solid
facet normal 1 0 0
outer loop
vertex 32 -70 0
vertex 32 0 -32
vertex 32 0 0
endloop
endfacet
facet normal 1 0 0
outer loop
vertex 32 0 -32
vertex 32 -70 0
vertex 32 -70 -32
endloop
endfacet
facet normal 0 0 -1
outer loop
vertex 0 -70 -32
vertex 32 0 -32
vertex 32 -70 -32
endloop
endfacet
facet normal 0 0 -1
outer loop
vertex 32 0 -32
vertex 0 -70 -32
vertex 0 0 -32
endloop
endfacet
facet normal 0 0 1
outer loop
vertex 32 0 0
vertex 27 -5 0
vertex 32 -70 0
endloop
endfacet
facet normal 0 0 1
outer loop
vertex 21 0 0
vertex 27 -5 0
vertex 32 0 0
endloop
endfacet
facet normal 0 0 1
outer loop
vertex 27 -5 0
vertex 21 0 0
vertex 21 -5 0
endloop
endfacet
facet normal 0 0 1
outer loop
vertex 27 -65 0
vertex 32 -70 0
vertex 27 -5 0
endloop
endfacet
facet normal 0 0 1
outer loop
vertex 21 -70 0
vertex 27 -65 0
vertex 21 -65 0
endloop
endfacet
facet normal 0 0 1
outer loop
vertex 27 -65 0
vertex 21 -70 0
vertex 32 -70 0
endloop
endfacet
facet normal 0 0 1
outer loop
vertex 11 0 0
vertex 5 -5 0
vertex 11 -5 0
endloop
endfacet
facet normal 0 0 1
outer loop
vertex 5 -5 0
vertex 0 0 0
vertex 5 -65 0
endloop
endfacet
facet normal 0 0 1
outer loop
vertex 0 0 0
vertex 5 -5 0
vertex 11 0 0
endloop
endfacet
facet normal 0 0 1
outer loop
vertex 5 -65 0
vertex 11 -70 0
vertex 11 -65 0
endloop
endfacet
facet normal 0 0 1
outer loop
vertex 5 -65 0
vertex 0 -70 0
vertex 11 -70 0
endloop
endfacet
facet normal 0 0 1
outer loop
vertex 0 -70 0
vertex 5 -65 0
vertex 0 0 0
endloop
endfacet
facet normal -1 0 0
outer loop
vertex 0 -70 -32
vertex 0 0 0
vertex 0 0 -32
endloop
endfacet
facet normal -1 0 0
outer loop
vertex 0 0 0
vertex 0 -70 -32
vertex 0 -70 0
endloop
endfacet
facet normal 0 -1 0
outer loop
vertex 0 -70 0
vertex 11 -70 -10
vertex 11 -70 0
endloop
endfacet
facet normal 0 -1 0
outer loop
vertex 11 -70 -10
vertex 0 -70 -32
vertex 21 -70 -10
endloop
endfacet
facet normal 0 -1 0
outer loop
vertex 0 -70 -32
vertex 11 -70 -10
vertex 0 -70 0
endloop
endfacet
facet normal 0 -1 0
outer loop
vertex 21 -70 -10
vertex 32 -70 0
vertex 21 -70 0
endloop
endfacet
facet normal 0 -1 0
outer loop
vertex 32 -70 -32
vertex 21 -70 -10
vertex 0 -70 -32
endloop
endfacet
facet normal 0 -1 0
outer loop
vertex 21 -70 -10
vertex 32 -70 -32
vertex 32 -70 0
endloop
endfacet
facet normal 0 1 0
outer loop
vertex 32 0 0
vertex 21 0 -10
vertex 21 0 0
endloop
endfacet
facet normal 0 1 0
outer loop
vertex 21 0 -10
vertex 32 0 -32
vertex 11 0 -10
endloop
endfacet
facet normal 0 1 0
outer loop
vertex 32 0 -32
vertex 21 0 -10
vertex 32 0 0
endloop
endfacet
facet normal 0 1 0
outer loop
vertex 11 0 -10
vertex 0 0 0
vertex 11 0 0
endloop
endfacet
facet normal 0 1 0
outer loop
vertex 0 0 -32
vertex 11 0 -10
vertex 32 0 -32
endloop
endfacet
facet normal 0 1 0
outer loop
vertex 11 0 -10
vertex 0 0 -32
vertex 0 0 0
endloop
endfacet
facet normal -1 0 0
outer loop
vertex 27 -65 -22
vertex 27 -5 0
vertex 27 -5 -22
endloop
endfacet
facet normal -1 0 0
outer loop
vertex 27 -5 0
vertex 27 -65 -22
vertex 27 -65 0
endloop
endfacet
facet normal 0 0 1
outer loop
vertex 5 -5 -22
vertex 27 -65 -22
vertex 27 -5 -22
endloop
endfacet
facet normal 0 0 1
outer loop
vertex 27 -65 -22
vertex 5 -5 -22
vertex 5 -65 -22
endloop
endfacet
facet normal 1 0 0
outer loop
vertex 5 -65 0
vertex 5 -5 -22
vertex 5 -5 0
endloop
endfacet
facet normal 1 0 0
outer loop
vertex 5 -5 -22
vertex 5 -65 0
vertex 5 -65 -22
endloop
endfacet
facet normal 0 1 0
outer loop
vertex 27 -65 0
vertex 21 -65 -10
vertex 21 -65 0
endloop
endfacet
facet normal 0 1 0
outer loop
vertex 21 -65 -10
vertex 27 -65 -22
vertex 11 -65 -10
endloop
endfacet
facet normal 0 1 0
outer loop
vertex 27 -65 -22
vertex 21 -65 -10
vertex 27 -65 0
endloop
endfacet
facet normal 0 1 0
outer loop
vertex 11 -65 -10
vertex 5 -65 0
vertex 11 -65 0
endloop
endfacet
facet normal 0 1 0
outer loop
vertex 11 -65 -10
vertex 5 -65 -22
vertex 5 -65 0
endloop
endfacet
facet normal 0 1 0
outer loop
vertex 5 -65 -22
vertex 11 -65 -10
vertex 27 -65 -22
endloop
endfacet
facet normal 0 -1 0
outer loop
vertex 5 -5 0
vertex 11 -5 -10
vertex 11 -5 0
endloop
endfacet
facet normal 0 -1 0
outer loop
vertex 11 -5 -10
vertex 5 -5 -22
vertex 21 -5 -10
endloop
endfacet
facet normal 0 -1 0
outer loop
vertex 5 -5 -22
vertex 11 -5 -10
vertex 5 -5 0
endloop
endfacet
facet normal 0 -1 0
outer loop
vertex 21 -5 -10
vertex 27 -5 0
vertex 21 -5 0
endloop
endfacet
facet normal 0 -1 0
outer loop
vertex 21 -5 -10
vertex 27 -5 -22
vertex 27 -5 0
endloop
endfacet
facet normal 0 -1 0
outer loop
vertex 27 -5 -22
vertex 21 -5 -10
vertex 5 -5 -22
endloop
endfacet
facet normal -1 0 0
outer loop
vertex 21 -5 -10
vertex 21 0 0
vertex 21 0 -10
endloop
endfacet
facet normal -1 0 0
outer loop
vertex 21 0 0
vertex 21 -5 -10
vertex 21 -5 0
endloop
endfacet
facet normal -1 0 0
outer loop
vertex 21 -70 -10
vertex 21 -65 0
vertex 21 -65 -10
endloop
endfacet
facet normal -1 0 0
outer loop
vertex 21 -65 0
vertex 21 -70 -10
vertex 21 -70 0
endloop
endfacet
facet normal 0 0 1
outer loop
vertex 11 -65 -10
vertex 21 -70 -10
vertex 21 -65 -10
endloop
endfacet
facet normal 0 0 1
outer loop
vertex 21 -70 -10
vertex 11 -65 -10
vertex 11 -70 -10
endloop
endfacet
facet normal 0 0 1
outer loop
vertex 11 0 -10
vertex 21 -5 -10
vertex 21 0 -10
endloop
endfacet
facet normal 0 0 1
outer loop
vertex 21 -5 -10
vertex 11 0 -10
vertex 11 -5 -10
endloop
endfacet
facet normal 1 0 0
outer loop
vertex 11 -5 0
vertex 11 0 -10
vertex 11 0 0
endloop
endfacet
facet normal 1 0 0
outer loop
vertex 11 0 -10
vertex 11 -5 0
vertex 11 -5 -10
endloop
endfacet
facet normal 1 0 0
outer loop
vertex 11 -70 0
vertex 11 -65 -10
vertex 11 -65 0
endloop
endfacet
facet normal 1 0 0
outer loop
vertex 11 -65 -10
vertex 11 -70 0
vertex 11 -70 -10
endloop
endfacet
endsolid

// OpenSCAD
rotate([180, 0, 0]) {

difference(){
  cube([32,70,32]);
  translate([5, 5, -1]) {
    cube(size=[22, 60, 23], center=false);
  }
  translate([11, -10, -1]) {
    cube([10,100,11]);
  }
}
}
